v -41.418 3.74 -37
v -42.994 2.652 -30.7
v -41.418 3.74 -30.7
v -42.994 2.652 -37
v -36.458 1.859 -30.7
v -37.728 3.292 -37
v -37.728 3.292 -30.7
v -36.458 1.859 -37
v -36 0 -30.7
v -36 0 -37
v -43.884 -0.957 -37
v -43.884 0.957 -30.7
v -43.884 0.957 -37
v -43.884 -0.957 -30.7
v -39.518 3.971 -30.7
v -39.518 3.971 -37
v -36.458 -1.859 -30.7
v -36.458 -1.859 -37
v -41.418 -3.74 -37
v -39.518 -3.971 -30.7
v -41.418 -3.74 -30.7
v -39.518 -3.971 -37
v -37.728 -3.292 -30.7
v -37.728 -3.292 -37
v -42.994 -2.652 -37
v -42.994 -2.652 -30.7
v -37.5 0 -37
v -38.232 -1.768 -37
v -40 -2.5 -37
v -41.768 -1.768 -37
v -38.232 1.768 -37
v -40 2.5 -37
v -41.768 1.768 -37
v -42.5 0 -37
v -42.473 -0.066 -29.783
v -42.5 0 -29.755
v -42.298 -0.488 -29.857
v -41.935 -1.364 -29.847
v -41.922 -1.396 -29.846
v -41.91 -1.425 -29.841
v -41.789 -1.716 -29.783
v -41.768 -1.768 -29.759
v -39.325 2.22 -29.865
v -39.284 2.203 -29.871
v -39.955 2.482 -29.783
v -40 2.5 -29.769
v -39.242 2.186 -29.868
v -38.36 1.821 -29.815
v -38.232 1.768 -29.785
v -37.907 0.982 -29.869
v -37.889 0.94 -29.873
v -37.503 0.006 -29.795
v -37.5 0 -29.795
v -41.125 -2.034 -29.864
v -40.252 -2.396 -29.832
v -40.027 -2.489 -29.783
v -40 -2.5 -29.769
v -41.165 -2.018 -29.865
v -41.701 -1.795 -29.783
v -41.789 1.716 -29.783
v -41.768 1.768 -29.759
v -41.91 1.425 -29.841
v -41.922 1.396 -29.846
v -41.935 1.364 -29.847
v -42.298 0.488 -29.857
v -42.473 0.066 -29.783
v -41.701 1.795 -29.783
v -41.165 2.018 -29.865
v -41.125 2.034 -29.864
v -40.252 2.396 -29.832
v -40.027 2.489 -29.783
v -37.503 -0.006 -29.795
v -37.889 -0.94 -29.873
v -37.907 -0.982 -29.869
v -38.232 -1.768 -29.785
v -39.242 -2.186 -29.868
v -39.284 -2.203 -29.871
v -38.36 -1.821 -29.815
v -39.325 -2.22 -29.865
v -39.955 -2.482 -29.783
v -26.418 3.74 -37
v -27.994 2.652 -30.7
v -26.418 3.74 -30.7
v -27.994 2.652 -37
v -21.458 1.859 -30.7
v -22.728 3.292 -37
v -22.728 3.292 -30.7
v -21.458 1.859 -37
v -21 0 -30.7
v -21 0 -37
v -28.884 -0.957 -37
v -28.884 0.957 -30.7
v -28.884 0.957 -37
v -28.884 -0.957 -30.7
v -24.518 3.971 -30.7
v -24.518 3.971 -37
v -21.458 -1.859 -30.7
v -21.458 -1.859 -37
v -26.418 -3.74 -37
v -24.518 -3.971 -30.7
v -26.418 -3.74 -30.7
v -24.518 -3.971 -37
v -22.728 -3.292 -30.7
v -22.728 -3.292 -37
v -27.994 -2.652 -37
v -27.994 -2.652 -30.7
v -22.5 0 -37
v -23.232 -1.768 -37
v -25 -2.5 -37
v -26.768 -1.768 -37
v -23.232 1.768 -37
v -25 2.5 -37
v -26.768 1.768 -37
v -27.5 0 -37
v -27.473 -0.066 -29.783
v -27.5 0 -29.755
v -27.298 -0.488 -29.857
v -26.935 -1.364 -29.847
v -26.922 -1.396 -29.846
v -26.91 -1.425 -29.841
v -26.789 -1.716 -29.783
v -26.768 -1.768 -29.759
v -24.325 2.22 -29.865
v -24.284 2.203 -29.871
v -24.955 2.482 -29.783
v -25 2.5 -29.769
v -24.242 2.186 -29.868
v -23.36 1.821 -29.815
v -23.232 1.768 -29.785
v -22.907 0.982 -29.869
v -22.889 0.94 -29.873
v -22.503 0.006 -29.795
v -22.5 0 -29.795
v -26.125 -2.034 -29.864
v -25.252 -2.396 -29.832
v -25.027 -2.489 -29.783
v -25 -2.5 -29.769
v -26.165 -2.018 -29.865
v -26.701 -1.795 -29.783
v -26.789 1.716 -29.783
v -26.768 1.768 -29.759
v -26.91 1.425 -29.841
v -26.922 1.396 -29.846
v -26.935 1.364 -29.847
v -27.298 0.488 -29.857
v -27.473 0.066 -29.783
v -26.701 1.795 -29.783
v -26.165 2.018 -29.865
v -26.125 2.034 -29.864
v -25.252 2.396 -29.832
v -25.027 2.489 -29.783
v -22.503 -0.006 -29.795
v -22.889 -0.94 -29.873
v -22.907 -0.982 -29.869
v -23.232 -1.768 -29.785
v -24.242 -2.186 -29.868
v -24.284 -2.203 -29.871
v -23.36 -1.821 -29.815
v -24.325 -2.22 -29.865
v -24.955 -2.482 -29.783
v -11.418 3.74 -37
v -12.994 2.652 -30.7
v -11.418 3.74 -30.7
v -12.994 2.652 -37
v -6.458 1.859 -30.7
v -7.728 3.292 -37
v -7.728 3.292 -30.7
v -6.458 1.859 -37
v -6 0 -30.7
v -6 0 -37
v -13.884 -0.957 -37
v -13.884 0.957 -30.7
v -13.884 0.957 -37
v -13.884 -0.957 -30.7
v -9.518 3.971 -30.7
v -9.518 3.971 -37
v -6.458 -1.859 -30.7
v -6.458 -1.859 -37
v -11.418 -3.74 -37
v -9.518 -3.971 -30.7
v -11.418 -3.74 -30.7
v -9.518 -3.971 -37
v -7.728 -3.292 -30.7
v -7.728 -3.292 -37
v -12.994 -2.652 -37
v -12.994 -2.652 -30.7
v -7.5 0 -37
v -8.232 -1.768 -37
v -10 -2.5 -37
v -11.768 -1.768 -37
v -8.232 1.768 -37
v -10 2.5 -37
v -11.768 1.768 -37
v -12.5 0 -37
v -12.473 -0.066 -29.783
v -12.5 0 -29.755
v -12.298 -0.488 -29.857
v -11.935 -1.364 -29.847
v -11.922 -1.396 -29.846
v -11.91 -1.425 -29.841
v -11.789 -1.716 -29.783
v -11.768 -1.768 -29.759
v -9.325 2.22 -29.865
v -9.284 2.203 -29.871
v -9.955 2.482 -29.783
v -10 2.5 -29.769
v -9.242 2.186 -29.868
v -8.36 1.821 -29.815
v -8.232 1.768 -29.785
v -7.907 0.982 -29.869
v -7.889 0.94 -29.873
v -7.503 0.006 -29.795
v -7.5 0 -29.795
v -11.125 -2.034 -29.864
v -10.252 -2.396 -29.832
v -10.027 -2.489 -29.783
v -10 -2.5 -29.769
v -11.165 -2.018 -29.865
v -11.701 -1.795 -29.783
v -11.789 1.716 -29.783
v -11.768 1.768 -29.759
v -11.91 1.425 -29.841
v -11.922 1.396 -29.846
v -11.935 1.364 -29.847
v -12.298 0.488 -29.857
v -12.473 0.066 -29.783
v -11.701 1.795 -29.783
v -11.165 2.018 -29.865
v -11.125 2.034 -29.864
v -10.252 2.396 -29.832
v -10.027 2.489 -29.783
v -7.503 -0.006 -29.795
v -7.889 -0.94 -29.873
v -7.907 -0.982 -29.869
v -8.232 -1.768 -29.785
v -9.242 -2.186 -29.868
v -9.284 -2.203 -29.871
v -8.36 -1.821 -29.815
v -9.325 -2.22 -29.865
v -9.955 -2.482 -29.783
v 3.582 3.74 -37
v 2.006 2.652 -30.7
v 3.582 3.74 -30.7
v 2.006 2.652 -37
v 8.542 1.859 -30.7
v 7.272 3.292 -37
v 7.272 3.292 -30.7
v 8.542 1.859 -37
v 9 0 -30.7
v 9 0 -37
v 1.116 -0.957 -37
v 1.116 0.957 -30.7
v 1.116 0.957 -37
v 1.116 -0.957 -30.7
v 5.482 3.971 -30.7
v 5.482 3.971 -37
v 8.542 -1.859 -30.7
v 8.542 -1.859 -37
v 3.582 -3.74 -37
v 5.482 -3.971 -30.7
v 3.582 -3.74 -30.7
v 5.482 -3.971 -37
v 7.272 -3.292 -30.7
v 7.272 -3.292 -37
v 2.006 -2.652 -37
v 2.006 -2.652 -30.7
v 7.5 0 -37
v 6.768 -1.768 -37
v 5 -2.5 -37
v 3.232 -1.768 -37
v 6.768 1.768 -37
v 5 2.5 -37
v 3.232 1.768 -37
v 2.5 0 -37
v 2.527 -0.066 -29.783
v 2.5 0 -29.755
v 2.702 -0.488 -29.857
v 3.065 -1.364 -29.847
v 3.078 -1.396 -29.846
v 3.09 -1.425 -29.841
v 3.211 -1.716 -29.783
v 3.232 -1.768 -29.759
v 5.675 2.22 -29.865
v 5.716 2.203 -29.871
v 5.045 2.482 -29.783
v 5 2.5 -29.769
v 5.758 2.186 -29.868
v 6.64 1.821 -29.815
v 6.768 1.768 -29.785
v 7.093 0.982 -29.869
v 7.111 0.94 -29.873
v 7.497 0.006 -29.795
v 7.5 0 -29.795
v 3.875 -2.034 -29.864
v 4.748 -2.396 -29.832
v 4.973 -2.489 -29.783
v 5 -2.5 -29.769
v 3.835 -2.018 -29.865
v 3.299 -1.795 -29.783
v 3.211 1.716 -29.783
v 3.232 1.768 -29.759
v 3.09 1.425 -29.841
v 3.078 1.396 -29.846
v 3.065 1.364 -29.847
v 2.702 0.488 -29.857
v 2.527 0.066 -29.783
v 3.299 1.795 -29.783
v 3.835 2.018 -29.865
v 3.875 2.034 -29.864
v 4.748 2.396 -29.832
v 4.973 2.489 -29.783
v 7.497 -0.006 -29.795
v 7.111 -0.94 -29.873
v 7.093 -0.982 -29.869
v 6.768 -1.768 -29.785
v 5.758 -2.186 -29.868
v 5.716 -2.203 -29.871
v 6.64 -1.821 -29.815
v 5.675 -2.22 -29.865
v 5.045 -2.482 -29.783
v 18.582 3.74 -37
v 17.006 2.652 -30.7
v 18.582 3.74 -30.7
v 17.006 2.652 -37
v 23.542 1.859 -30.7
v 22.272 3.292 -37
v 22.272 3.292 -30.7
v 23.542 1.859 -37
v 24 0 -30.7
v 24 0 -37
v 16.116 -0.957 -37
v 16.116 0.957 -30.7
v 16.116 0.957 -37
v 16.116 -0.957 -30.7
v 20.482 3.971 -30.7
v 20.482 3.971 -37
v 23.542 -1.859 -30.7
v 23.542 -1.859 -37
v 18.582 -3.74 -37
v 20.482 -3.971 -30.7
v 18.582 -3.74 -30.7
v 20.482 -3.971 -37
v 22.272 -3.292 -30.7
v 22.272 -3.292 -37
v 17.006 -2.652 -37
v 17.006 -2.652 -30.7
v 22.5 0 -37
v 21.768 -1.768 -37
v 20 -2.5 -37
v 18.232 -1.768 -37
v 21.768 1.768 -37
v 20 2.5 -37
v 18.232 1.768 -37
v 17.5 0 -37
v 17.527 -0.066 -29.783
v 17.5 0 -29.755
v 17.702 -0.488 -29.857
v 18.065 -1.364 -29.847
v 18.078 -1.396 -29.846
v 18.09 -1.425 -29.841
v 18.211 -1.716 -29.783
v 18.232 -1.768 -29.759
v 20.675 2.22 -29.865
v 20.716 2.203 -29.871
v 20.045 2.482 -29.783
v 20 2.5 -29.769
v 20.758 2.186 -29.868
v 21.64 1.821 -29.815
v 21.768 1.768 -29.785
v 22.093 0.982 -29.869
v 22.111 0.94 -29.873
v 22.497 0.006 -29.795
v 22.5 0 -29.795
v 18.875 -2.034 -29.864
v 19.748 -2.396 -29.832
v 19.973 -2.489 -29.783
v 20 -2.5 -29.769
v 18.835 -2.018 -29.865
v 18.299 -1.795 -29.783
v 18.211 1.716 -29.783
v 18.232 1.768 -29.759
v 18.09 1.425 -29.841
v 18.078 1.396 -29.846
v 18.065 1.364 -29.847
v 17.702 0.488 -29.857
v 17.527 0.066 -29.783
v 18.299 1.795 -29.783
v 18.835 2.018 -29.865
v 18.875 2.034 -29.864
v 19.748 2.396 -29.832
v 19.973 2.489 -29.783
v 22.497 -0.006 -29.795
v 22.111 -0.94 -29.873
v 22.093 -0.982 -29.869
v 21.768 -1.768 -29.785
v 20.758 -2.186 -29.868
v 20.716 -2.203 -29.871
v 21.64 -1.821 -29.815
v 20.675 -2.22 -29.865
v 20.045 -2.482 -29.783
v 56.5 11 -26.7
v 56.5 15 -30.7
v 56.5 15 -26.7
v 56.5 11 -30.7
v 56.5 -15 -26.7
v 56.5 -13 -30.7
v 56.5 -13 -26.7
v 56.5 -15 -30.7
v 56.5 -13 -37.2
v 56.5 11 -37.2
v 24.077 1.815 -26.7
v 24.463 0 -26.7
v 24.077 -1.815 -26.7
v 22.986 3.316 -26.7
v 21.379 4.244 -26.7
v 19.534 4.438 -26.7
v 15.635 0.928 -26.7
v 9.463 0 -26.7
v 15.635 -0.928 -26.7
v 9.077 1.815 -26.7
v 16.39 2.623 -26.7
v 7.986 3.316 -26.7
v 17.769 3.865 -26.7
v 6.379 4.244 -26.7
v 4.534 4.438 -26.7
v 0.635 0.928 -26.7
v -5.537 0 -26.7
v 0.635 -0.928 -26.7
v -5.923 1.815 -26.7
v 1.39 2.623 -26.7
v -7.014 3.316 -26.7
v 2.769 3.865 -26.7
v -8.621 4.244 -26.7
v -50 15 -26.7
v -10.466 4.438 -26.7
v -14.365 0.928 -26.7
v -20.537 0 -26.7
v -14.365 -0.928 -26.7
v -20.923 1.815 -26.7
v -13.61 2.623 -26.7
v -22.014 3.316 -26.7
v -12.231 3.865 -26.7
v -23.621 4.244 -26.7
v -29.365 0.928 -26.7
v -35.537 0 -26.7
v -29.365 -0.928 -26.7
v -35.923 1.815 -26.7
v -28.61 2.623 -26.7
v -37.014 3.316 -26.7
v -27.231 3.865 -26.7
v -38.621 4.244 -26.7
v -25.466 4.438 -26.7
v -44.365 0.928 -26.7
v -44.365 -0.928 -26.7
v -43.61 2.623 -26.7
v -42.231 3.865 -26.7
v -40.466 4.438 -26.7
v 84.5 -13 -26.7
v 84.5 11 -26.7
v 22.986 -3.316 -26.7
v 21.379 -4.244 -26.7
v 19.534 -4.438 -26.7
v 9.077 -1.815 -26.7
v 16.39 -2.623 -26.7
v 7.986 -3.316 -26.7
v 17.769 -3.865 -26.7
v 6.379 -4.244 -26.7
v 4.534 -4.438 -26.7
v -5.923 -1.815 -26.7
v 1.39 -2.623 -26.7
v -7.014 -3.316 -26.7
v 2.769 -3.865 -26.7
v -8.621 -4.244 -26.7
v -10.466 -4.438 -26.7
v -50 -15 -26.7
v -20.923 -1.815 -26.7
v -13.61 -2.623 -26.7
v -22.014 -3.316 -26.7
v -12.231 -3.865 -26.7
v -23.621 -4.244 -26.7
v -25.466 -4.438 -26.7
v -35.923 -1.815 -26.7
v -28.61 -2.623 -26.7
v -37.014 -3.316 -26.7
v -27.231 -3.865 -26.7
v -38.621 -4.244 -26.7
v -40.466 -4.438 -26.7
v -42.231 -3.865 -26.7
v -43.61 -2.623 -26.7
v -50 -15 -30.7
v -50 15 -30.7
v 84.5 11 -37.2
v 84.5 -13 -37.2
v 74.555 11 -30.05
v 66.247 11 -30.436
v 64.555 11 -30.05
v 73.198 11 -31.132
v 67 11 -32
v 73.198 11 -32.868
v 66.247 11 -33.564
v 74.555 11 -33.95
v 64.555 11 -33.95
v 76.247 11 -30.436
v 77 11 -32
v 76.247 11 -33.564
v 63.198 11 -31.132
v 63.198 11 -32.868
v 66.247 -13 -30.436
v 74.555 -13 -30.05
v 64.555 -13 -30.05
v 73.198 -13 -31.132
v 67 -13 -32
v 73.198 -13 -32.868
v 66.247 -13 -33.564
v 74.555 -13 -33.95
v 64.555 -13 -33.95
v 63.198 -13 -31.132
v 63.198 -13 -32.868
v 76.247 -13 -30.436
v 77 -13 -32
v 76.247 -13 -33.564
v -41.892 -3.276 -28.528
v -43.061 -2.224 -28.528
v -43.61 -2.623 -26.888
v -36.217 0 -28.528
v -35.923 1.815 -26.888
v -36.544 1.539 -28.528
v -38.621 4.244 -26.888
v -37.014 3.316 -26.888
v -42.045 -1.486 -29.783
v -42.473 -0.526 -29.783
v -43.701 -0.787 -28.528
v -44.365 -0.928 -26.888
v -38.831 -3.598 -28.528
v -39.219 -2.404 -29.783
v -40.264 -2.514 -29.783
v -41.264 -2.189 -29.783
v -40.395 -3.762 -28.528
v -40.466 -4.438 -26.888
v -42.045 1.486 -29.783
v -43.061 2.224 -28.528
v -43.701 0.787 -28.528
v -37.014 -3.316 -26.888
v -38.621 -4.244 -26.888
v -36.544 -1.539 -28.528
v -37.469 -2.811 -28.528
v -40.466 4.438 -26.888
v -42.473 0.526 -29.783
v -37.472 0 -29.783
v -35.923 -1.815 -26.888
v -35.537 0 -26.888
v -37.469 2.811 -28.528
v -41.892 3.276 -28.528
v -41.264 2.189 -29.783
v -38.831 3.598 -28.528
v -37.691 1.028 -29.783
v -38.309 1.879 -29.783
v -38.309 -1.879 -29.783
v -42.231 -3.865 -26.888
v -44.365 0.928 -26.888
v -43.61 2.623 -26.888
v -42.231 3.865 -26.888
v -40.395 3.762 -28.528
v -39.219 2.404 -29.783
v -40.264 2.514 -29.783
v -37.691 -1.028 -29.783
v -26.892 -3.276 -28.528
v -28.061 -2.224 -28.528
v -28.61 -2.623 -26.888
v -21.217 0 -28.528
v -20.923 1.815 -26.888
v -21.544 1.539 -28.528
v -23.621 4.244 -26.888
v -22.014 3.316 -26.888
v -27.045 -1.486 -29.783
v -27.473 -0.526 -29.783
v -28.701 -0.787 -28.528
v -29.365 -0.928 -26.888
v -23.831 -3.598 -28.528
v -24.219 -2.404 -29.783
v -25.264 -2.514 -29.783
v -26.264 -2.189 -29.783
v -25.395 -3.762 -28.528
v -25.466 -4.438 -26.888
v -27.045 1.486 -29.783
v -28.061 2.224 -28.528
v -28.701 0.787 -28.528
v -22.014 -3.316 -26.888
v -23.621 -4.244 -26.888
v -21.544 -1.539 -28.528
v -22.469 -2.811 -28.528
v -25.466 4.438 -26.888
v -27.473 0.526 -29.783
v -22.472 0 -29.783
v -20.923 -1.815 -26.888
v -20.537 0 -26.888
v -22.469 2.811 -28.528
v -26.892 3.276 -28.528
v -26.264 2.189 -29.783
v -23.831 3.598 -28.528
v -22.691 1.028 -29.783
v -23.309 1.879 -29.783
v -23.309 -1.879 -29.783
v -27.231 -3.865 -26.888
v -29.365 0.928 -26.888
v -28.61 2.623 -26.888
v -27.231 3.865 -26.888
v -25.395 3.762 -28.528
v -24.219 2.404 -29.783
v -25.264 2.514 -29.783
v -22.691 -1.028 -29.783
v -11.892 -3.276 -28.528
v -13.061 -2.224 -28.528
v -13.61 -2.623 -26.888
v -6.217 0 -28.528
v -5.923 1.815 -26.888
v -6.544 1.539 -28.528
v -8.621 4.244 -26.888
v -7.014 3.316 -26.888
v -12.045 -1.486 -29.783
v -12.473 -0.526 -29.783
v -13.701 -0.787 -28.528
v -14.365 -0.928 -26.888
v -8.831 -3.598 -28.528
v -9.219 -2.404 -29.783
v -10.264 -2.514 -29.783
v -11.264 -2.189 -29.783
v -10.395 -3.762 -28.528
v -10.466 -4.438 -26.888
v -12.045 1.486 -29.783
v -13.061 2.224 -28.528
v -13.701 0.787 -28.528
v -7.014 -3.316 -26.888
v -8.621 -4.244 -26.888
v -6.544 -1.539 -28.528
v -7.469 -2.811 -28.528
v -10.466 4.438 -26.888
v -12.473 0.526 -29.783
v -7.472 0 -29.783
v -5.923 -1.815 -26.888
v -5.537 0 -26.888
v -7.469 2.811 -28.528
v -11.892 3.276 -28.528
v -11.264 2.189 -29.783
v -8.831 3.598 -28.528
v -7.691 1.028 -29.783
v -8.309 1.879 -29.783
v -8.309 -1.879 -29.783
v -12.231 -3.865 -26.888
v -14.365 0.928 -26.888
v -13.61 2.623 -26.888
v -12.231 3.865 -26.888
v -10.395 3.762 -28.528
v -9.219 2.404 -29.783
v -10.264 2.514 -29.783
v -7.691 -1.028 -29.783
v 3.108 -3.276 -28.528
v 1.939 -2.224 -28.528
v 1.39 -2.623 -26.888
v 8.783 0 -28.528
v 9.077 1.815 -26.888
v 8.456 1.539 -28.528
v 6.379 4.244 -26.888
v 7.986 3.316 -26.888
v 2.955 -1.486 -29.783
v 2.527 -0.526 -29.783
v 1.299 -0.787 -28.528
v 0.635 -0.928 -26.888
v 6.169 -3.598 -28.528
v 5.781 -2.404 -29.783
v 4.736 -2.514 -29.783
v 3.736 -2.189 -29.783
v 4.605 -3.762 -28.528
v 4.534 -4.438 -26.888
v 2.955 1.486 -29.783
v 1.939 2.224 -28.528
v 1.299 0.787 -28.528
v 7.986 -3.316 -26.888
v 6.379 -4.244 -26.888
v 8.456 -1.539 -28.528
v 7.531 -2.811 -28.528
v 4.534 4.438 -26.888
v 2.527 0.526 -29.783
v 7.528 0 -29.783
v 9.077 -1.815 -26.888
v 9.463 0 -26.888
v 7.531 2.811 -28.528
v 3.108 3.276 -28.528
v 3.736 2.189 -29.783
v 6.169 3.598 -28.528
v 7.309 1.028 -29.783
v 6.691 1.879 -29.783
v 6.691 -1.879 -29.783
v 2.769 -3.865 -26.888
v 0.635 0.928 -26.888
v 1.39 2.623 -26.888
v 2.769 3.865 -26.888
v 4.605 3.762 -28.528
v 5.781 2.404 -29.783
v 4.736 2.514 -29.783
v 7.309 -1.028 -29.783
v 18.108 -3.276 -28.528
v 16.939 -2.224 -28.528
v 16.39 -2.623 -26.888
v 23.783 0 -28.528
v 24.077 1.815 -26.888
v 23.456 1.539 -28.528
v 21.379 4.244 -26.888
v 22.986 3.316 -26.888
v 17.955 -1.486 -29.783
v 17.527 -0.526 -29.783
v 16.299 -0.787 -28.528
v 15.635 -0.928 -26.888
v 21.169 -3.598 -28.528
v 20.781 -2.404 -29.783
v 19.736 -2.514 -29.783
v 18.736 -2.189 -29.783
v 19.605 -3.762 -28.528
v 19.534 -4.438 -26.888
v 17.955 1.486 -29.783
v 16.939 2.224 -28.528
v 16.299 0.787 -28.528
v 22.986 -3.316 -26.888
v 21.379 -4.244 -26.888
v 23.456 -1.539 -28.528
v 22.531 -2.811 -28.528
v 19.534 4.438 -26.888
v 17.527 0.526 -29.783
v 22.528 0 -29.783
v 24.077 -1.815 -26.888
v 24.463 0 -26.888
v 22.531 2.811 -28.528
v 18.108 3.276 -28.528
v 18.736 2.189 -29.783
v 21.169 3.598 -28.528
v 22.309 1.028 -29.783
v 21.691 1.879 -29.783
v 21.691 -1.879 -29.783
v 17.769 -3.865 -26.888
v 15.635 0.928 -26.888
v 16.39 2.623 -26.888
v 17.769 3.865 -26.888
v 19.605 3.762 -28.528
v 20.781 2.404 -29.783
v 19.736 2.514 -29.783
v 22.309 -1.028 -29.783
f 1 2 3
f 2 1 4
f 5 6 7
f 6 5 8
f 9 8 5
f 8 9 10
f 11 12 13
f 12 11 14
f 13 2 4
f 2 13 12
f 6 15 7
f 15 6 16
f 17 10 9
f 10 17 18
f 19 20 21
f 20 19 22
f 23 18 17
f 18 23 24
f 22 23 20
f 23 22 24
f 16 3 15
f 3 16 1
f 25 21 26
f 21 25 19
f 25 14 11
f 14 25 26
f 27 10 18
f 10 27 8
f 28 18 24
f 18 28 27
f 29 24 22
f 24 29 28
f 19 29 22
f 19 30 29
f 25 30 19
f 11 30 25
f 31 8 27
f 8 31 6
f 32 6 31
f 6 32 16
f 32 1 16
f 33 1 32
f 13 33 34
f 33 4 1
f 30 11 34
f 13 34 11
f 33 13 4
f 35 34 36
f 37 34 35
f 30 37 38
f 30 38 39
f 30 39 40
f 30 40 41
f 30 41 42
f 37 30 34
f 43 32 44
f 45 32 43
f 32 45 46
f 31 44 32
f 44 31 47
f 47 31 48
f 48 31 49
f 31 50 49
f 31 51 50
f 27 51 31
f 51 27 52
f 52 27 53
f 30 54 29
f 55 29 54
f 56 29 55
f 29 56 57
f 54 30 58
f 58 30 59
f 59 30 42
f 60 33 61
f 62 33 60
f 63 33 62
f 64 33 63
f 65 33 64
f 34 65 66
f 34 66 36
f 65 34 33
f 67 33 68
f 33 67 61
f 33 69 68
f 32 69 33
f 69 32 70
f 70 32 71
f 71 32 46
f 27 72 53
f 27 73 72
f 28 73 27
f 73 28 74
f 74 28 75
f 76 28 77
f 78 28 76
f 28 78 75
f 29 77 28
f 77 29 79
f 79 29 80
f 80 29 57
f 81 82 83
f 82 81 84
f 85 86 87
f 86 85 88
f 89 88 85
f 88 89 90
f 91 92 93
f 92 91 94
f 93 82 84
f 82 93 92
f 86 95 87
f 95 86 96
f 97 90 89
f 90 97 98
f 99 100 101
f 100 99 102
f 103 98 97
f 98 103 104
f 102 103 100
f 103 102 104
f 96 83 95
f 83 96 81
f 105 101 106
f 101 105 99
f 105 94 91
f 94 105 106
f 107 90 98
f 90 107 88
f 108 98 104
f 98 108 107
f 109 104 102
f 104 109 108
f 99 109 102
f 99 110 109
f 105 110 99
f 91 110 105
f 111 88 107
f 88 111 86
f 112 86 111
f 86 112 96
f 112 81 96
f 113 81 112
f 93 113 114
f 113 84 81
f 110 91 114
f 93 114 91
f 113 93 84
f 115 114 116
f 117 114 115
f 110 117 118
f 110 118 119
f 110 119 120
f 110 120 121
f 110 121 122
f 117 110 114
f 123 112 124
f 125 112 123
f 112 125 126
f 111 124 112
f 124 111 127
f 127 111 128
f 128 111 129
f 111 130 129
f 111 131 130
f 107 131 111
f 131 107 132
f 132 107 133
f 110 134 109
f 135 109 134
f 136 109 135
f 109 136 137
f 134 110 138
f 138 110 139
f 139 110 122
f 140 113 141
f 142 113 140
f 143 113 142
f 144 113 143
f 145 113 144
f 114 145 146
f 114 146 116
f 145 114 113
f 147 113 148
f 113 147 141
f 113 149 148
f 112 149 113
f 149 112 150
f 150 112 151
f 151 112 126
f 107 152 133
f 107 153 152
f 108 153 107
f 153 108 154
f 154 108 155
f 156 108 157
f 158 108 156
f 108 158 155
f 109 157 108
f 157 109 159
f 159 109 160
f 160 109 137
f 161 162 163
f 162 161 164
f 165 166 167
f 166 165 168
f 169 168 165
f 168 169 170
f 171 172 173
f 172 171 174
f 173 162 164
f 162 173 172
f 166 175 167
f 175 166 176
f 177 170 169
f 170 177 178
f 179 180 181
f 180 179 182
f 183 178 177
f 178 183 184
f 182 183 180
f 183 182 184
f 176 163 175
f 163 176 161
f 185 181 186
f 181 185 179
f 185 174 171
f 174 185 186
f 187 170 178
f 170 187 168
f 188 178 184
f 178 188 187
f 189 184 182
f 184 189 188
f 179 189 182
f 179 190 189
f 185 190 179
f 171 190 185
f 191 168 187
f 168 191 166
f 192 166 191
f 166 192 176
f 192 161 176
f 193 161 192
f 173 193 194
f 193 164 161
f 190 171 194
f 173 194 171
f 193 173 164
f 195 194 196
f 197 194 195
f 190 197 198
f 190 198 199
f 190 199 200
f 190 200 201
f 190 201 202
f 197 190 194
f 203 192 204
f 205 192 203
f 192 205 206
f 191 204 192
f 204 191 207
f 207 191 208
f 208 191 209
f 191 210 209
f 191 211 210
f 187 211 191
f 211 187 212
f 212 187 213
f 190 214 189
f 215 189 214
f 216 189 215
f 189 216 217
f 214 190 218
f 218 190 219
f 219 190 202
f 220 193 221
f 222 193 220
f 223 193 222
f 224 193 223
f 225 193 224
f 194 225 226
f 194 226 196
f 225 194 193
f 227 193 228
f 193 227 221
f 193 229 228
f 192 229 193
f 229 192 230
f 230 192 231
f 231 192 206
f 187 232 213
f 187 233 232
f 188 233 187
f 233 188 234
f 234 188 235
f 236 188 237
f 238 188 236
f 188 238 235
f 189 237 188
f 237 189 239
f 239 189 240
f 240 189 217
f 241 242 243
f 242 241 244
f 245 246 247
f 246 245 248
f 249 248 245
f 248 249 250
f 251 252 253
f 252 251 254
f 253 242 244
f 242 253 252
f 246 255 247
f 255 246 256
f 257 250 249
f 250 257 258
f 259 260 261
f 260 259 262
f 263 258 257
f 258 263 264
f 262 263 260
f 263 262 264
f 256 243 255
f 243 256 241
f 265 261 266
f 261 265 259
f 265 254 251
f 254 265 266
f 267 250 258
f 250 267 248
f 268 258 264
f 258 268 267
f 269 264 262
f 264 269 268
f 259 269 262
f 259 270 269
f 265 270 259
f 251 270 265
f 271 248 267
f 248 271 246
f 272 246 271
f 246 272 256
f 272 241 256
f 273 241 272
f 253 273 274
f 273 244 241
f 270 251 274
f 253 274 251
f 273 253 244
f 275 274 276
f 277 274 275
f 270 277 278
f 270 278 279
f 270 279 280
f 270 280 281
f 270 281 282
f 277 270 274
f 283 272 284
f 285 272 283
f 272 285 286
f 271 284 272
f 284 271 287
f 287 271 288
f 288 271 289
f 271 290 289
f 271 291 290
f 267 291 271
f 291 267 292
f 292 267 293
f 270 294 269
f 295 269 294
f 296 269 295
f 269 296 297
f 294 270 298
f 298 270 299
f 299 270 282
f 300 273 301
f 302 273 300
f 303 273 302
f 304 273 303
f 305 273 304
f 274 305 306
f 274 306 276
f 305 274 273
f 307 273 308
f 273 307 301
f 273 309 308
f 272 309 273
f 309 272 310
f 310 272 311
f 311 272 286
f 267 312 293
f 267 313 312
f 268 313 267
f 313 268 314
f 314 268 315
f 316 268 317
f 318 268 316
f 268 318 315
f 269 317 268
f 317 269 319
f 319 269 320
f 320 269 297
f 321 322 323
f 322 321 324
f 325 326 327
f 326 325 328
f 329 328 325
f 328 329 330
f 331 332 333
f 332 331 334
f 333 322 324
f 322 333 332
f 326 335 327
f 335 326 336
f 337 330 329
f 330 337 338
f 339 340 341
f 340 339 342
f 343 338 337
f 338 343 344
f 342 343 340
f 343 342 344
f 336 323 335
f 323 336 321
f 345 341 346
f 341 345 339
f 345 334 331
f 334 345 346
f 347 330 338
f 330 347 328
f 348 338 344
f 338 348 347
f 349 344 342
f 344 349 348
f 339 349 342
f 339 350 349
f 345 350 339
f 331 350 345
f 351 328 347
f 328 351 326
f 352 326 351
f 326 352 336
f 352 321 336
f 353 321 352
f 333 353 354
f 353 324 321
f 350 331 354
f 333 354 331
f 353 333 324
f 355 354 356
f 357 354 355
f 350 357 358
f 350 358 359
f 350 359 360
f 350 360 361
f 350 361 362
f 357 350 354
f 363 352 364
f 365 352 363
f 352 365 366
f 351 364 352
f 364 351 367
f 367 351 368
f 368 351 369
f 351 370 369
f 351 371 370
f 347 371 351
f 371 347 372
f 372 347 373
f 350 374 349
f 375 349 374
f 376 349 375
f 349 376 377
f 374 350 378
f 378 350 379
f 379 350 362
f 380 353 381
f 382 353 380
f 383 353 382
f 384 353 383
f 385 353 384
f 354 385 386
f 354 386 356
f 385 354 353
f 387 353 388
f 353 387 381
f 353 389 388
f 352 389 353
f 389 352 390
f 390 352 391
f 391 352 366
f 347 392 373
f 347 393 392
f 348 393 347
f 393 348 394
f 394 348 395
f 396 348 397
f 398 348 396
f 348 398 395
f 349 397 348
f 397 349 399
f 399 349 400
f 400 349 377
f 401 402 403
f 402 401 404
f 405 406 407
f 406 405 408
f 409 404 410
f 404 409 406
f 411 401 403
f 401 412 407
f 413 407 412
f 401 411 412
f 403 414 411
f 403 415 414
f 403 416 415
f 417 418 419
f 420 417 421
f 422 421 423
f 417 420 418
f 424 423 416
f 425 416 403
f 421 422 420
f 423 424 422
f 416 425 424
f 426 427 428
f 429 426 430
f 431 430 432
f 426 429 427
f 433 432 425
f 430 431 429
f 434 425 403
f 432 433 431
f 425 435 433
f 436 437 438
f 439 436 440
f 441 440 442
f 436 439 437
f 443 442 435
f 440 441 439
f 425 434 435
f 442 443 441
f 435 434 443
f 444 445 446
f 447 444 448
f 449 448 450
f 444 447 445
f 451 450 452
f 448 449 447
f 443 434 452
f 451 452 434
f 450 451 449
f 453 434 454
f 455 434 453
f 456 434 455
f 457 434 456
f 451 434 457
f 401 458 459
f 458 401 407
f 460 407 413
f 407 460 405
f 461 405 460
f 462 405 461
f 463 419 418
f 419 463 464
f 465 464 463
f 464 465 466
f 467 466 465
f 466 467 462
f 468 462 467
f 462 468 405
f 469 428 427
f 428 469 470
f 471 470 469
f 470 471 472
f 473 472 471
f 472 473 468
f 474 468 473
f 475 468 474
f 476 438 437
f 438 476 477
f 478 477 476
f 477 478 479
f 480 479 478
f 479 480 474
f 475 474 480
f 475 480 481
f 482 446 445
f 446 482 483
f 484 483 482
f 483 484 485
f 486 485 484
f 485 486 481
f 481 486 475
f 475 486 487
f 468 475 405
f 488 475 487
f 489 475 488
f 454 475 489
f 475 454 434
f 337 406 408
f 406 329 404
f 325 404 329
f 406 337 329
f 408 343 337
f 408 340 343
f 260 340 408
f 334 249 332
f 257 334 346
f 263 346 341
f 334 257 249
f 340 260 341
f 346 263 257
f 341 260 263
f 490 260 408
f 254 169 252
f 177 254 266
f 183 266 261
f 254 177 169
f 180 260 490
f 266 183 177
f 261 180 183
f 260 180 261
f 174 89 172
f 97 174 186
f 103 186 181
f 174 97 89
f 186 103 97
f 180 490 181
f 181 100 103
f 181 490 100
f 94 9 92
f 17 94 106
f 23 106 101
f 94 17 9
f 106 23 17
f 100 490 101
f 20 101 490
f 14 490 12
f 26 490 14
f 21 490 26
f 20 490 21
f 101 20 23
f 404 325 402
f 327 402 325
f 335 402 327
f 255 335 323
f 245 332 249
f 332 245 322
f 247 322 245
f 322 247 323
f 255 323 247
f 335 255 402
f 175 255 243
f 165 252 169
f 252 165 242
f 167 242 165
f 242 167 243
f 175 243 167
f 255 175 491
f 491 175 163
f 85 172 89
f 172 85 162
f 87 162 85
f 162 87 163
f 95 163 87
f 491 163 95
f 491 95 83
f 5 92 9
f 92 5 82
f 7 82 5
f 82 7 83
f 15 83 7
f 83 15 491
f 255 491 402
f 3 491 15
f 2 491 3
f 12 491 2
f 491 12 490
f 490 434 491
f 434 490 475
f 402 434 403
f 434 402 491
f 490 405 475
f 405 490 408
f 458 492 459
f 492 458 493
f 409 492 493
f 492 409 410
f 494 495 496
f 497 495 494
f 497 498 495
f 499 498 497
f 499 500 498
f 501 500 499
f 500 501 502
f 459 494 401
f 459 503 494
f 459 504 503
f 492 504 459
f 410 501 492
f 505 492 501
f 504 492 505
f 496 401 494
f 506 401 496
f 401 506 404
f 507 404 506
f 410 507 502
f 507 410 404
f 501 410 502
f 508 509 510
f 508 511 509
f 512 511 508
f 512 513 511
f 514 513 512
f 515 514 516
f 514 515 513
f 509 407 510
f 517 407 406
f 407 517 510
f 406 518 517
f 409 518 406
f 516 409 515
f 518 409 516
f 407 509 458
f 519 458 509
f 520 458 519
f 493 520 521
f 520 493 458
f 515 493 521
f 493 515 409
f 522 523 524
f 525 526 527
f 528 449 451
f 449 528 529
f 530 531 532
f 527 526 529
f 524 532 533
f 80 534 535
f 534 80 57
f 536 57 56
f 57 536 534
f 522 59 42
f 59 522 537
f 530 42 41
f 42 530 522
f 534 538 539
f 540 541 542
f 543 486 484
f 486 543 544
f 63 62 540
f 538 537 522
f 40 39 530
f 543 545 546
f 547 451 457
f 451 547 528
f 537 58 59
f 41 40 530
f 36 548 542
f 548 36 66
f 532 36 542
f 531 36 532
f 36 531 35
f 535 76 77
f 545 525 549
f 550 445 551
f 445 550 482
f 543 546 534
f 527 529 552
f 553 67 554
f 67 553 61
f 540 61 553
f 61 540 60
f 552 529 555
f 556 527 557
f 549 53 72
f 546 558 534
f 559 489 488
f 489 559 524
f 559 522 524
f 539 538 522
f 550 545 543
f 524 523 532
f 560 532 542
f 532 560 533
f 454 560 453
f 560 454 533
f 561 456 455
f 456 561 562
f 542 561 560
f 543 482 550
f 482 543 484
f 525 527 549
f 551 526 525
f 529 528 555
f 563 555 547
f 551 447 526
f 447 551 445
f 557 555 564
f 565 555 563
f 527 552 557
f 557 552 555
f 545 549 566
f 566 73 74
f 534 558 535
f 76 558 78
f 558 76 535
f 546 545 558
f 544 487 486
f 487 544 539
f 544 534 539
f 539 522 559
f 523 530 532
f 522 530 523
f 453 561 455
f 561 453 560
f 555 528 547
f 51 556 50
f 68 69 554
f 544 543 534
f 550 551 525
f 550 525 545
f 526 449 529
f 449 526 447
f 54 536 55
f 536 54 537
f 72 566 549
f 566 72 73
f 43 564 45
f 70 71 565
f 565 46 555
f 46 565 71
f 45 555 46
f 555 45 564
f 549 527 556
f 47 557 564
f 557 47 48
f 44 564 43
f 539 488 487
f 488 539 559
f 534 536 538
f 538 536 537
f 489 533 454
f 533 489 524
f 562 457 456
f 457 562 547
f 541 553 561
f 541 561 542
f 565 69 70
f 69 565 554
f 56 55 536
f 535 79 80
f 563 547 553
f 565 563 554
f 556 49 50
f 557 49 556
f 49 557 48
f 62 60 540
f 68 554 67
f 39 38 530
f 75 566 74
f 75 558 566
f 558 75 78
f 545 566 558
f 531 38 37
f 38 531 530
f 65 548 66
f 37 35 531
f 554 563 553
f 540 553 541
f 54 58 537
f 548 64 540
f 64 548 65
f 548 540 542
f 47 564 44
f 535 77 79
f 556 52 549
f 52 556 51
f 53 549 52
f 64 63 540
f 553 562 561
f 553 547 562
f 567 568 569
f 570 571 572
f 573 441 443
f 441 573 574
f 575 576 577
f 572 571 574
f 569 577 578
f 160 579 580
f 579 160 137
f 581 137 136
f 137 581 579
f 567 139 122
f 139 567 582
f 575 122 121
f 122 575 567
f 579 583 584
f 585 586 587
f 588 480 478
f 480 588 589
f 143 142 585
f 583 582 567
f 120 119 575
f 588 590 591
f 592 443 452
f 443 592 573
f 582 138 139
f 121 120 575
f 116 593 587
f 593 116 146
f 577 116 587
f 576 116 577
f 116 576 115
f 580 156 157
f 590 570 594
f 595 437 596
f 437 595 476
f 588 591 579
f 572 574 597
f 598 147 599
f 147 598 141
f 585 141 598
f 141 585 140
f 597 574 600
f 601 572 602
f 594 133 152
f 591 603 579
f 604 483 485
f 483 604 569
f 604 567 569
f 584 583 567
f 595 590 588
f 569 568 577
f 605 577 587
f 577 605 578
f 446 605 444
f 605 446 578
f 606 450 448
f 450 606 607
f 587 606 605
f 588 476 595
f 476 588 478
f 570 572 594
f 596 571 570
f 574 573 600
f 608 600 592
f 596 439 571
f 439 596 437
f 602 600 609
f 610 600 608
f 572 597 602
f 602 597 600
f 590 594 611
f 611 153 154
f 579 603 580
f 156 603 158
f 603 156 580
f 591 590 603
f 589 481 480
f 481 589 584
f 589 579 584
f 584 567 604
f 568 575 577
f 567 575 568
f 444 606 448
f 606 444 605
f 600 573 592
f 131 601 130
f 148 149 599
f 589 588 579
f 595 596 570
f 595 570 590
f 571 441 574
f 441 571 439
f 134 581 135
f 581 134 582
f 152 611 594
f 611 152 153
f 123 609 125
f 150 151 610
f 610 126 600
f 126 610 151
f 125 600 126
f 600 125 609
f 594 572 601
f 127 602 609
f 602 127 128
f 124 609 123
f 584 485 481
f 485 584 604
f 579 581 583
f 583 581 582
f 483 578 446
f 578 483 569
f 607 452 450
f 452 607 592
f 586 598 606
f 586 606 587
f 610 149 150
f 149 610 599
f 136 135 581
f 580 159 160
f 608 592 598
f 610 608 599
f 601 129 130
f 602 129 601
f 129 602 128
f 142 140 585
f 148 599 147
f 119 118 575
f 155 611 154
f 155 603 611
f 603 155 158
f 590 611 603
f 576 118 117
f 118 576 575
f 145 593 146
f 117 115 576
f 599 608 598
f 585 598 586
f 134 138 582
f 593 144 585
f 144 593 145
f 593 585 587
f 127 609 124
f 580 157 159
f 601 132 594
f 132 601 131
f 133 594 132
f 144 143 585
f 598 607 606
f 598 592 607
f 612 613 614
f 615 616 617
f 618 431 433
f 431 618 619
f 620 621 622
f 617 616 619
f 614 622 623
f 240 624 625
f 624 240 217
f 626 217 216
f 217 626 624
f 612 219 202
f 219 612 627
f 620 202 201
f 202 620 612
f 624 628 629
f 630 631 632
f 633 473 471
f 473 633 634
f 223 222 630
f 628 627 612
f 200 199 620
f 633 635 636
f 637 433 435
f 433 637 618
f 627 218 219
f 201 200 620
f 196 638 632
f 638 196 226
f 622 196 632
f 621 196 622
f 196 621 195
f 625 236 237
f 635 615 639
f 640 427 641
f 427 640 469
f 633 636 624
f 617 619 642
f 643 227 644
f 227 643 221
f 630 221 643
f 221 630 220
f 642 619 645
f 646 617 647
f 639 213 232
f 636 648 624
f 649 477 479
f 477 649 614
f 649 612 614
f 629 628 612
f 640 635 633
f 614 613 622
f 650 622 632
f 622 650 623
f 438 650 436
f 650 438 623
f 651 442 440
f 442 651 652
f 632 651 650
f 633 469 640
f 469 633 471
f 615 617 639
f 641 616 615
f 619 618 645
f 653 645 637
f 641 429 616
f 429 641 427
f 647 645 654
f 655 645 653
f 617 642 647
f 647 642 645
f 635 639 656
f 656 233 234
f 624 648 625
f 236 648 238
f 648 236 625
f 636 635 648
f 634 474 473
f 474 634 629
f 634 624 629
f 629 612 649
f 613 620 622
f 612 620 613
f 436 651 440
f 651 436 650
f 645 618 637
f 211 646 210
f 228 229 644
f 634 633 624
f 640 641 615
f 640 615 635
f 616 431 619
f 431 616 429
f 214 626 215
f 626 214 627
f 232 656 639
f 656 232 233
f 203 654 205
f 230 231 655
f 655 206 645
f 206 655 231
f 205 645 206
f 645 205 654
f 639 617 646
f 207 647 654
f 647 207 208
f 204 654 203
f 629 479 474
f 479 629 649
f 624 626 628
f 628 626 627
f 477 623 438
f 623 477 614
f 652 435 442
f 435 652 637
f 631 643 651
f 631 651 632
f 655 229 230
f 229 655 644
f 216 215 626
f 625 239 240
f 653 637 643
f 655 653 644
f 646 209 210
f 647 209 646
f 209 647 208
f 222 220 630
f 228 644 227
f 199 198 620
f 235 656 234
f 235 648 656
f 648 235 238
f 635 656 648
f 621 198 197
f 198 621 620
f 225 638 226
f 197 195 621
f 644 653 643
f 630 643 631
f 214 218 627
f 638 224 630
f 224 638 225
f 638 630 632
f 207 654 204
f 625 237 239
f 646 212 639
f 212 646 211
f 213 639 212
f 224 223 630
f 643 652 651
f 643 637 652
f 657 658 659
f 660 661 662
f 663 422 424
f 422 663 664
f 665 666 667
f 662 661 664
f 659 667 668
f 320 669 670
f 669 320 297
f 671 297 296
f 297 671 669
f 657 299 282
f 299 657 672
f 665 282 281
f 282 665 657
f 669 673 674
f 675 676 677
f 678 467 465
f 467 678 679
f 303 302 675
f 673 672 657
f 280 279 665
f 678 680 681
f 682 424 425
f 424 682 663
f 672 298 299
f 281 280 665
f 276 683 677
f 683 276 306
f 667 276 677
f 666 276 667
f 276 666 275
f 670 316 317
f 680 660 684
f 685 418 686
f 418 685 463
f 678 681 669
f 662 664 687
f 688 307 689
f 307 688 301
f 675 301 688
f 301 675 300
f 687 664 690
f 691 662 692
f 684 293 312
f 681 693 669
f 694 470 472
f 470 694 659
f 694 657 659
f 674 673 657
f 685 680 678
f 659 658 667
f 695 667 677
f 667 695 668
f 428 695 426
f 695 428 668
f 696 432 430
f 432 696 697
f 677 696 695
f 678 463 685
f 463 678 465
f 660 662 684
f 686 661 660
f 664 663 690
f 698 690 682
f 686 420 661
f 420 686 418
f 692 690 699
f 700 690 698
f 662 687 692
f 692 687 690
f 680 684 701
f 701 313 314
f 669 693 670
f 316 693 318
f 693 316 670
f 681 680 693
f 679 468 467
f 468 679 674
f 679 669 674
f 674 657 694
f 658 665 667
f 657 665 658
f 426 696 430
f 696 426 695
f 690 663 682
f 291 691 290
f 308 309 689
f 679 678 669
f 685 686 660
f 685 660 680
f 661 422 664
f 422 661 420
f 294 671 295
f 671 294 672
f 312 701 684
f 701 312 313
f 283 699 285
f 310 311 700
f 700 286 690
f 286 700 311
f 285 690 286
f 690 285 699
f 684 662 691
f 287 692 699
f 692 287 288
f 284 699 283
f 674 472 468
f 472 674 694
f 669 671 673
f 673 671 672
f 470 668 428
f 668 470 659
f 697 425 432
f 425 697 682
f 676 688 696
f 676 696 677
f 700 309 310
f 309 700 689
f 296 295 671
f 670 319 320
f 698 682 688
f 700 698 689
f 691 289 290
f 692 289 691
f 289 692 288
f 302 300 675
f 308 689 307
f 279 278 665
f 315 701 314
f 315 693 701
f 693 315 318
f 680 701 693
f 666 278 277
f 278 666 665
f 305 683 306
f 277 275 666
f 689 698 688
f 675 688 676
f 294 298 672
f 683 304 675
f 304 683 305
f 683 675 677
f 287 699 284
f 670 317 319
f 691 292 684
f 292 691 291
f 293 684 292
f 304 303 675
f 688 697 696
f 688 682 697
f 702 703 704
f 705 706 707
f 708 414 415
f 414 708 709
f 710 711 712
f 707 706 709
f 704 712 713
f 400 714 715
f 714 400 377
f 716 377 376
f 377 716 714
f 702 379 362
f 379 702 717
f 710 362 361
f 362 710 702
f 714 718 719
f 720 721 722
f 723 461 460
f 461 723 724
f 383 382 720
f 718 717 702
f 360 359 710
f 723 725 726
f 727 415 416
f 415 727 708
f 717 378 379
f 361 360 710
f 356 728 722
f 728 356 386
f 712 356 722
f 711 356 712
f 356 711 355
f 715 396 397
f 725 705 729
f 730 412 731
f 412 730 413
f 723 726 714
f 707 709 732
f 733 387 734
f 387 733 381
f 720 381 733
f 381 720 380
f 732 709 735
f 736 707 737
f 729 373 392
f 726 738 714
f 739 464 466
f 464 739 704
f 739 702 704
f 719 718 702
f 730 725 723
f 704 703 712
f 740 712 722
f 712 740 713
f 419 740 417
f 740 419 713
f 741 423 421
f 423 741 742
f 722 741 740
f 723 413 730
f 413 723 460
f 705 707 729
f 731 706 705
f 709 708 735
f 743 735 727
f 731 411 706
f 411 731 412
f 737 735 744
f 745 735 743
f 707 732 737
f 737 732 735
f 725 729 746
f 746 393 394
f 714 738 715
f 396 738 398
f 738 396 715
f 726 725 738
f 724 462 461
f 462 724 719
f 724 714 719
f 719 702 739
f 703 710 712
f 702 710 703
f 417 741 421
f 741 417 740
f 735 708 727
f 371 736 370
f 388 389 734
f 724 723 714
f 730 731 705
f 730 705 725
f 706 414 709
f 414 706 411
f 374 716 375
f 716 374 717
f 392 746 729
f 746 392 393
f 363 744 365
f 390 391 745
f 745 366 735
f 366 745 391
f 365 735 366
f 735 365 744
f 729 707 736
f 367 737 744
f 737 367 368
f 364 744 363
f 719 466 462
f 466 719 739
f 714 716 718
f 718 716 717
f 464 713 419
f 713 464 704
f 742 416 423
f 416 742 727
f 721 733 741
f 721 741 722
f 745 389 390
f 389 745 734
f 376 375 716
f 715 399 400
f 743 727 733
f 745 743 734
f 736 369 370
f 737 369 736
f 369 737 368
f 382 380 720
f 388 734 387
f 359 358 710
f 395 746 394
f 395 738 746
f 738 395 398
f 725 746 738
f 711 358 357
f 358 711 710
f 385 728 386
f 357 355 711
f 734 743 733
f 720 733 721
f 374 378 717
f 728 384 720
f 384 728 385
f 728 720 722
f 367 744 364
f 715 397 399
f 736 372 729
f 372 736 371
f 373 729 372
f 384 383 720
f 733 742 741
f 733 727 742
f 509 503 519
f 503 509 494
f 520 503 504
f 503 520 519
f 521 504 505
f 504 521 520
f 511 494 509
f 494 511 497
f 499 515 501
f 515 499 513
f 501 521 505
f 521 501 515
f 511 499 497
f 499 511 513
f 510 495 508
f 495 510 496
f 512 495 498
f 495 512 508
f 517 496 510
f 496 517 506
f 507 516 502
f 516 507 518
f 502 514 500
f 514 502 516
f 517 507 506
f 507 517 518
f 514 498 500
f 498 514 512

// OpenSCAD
//This is a modification of " Public Domain Parametric Involute Spur Gear (and involute helical gear and involute rack)
// by Leemon Baird, 2011, Leemon@Leemon.com
//http://www.thingiverse.com/thing:5505  "

//Modifications by racatack June 2016:
//  -Incorporated 'module InvoluteGear_rack()' from the 11/11/15 comment by quisam2342 in thing:5505 to fix noted problems in rack generation at various tooth sizes
//  -Added a section for an optional 'backboard' that can be used to stiffen an otherwise skinny rack
//  -Added sections for optional Stop Blocks at either or both ends of a rack
//  -Removed extra gears from the example since I only need one pinion. See thing:5505 example section to gain more insight into gear generation.





//////////////////////////////////////////////////////////////////////////////////////////////
// Public Domain Parametric Involute Spur Gear (and involute helical gear and involute rack)
// version 1.1
// by Leemon Baird, 2011, Leemon@Leemon.com
//http://www.thingiverse.com/thing:5505
//
// This file is public domain.  Use it for any purpose, including commercial
// applications.  Attribution would be nice, but is not required.  There is
// no warranty of any kind, including its correctness, usefulness, or safety.
// 
// This is parameterized involute spur (or helical) gear.  It is much simpler and less powerful than
// others on Thingiverse.  But it is public domain.  I implemented it from scratch from the 
// descriptions and equations on Wikipedia and the web, using Mathematica for calculations and testing,
// and I now release it into the public domain.
//
//		http://en.wikipedia.org/wiki/Involute_gear
//		http://en.wikipedia.org/wiki/Gear
//		http://en.wikipedia.org/wiki/List_of_gear_nomenclature
//		http://gtrebaol.free.fr/doc/catia/spur_gear.html
//		http://www.cs.cmu.edu/~rapidproto/mechanisms/chpt7.html
//
// The module gear() gives an involute spur gear, with reasonable defaults for all the parameters.
// Normally, you should just choose the first 4 parameters, and let the rest be default values.
// The module gear() gives a gear in the XY plane, centered on the origin, with one tooth centered on
// the positive Y axis.  The various functions below it take the same parameters, and return various
// measurements for the gear.  The most important is pitch_radius, which tells how far apart to space
// gears that are meshing, and adendum_radius, which gives the size of the region filled by the gear.
// A gear has a "pitch circle", which is an invisible circle that cuts through the middle of each
// tooth (though not the exact center). In order for two gears to mesh, their pitch circles should 
// just touch.  So the distance between their centers should be pitch_radius() for one, plus pitch_radius() 
// for the other, which gives the radii of their pitch circles.
//
// In order for two gears to mesh, they must have the same mm_per_tooth and pressure_angle parameters.  
// mm_per_tooth gives the number of millimeters of arc around the pitch circle covered by one tooth and one
// space between teeth.  The pitch angle controls how flat or bulged the sides of the teeth are.  Common
// values include 14.5 degrees and 20 degrees, and occasionally 25.  Though I've seen 28 recommended for
// plastic gears. Larger numbers bulge out more, giving stronger teeth, so 28 degrees is the default here.
//
// The ratio of number_of_teeth for two meshing gears gives how many times one will make a full 
// revolution when the the other makes one full revolution.  If the two numbers are coprime (i.e. 
// are not both divisible by the same number greater than 1), then every tooth on one gear
// will meet every tooth on the other, for more even wear.  So coprime numbers of teeth are good.
//
// The module rack() gives a rack, which is a bar with teeth.  A rack can mesh with any
// gear that has the same mm_per_tooth and pressure_angle.
//
// Some terminology: 
// The outline of a gear is a smooth circle (the "pitch circle") which has mountains and valleys
// added so it is toothed.  So there is an inner circle (the "root circle") that touches the 
// base of all the teeth, an outer circle that touches the tips of all the teeth,
// and the invisible pitch circle in between them.  There is also a "base circle", which can be smaller than
// all three of the others, which controls the shape of the teeth.  The side of each tooth lies on the path 
// that the end of a string would follow if it were wrapped tightly around the base circle, then slowly unwound.  
// That shape is an "involute", which gives this type of gear its name.
//
//////////////////////////////////////////////////////////////////////////////////////////////

//An involute spur gear, with reasonable defaults for all the parameters.
//Normally, you should just choose the first 4 parameters, and let the rest be default values.
//Meshing gears must match in mm_per_tooth, pressure_angle, and twist,
//and be separated by the sum of their pitch radii, which can be found with pitch_radius().
module gear (
	mm_per_tooth    = 3,    //this is the "circular pitch", the circumference of the pitch circle divided by the number of teeth
	number_of_teeth = 11,   //total number of teeth around the entire perimeter
	thickness       = 6,    //thickness of gear in mm
	hole_diameter   = 3,    //diameter of the hole in the center, in mm
	twist           = 0,    //teeth rotate this many degrees from bottom of gear to top.  360 makes the gear a screw with each thread going around once
	teeth_to_hide   = 0,    //number of teeth to delete to make this only a fraction of a circle
	pressure_angle  = 28,   //Controls how straight or bulged the tooth sides are. In degrees.
	clearance       = 0.0,  //gap between top of a tooth on one gear and bottom of valley on a meshing gear (in millimeters)
	backlash        = 0.0   //gap between two meshing teeth, in the direction along the circumference of the pitch circle
) {
	assign(pi = 3.1415926)
	assign(p  = mm_per_tooth * number_of_teeth / pi / 2)  //radius of pitch circle
	assign(c  = p + mm_per_tooth / pi - clearance)        //radius of outer circle
	assign(b  = p*cos(pressure_angle))                    //radius of base circle
	assign(r  = p-(c-p)-clearance)                        //radius of root circle
	assign(t  = mm_per_tooth/2-backlash/2)                //tooth thickness at pitch circle
	assign(k  = -iang(b, p) - t/2/p/pi*180) {             //angle to where involute meets base circle on each side of tooth
		difference() {
			for (i = [0:number_of_teeth-teeth_to_hide-1] )
				rotate([0,0,i*360/number_of_teeth])
					linear_extrude(height = thickness, center = true, convexity = 10, twist = twist)
						polygon(
							points=[
								[0, -hole_diameter/10],
								polar(r, -181/number_of_teeth),
								polar(r, r<b ? k : -180/number_of_teeth),
								q7(0/5,r,b,c,k, 1),q7(1/5,r,b,c,k, 1),q7(2/5,r,b,c,k, 1),q7(3/5,r,b,c,k, 1),q7(4/5,r,b,c,k, 1),q7(5/5,r,b,c,k, 1),
								q7(5/5,r,b,c,k,-1),q7(4/5,r,b,c,k,-1),q7(3/5,r,b,c,k,-1),q7(2/5,r,b,c,k,-1),q7(1/5,r,b,c,k,-1),q7(0/5,r,b,c,k,-1),
								polar(r, r<b ? -k : 180/number_of_teeth),
								polar(r, 181/number_of_teeth)
							],
 							paths=[[0,1,2,3,4,5,6,7,8,9,10,11,12,13,14,15,16]]
						);
			cylinder(h=2*thickness+1, r=hole_diameter/2, center=true, $fn=20);
		}
	}
};	
//these 4 functions are used by gear
function polar(r,theta)   = r*[sin(theta), cos(theta)];                            //convert polar to cartesian coordinates
function iang(r1,r2)      = sqrt((r2/r1)*(r2/r1) - 1)/3.1415926*180 - acos(r1/r2); //unwind a string this many degrees to go from radius r1 to radius r2
function q7(f,r,b,r2,t,s) = q6(b,s,t,(1-f)*max(b,r)+f*r2);                         //radius a fraction f up the curved side of the tooth 
function q6(b,s,t,d)      = polar(d,s*(iang(b,d)+t));                              //point at radius d on the involute curve

//a rack, which is a straight line with teeth (the same as a segment from a giant gear with a huge number of teeth).
//The "pitch circle" is a line along the X axis.
//module rack (
//	mm_per_tooth    = 3,    //this is the "circular pitch", the circumference of the pitch circle divided by the number //of teeth
//	number_of_teeth = 11,   //total number of teeth along the rack
//	thickness       = 6,    //thickness of rack in mm (affects each tooth)
//	height          = 120,   //height of rack in mm, from tooth top to far side of rack.
//	pressure_angle  = 28,   //Controls how straight or bulged the tooth sides are. In degrees.
//	backlash        = 0.0   //gap between two meshing teeth, in the direction along the circumference of the pitch circle
//) {
//	assign(pi = 3.1415926)
//	assign(a = mm_per_tooth / pi) //addendum
//	assign(t = a*cos(pressure_angle)-1)         //tooth side is tilted so top/bottom corners move this amount
//		for (i = [0:number_of_teeth-1] )
//			translate([i*mm_per_tooth,0,0])
//				linear_extrude(height = thickness, center = true, convexity = 10)
//					polygon(
//						points=[
//							[-mm_per_tooth * 3/4,                 a-height],
//							[-mm_per_tooth * 3/4 - backlash,     -a],
//							[-mm_per_tooth * 1/4 + backlash - t, -a],
//							[-mm_per_tooth * 1/4 + backlash + t,  a],
//							[ mm_per_tooth * 1/4 - backlash - t,  a],
//							[ mm_per_tooth * 1/4 - backlash + t, -a],
//							[ mm_per_tooth * 3/4 + backlash,     -a],
//							[ mm_per_tooth * 3/4,                 a-height],
//						],
//						paths=[[0,1,2,3,4,5,6,7]]
//					);
//};	


  //rac note - This section generates the rack body and teeth. It is from the 11/11/15 comment by quisam2342 in thing:5505 to fix noted problems with rack generation, and replaces the original 'module rack()'
////////////////////////////////////////////////////////////////////////////////////////////////
// The module InvoluteGear_rack() gives a involute gear rack, which is a bar with teeth.
// A rack can mesh with any gear that has the same mm_per_tooth and pressure_angle.
// The "pitch circle" is a line along the X axis.
//
// mm_per_tooth     this is the "circular pitch", the circumference of the pitch circle
//                  divided by the number of teeth
//
// number_of_teeth  total number of teeth along the rack
//
// thickness        thickness of rack in mm
//
// height           height of rack in mm, from tooth top to far side of rack
//
// pressure_angle   controls how straight or bulged the tooth sides are, in degrees
//
// clearance        gap between top of a tooth on one gear and bottom of valley
//                  on a meshing gear, in millimeters
//
// backlash         gap between two meshing teeth, in the direction along the circumference
//                  of the pitch circle
////////////////////////////////////////////////////////////////////////////////////////////////



module InvoluteGear_rack (
    mm_per_tooth    = 3,   //Default numbers in this section get overridden by numbers in 'example rack and pinion' section, so set your values there.
    number_of_teeth = 11,
    thickness       = 6,
    height          = 4,
    
  //rac - Added variables for backboard and stop blocks: 
 //set your values in the 'example rack and pinion' section, as defaults given here will be overridden by that section 
    backboard_thickness = 2.0,
    backboard_height = 1.0, 
    stop_height = backboard_height, 
    left_stop_enable = 1, 
    right_stop_enable = 1,
    
//These defaults are not redefined in the example section:
    pressure_angle  = 28,  
    clearance       = 0.0,
    backlash        = 0.0

)

{
    // addendum - tooth height above pitch line
    assign(addendum =        module_value(mm_per_tooth) - clearance)

    // dedendum - tooth height below pitch line
    assign(dedendum = 1.25 * module_value(mm_per_tooth)            ) 


    for (i = [0:number_of_teeth-1] )
        translate([(i+0.5)*mm_per_tooth,height-addendum,0])
            linear_extrude(height = thickness, center = true, convexity = 10)  //'height' parameter here is not the same as 'height' parameter of module
                polygon(
                    points=[
                        [-1/2 * mm_per_tooth,                                              addendum-height],
                        [-1/2 * mm_per_tooth,                                             -dedendum],
                        [-1/4 * mm_per_tooth + backlash - dedendum * tan(pressure_angle), -dedendum],
                        [-1/4 * mm_per_tooth + backlash + addendum * tan(pressure_angle),  addendum],
                        [ 1/4 * mm_per_tooth - backlash - addendum * tan(pressure_angle),  addendum],
                        [ 1/4 * mm_per_tooth - backlash + dedendum * tan(pressure_angle), -dedendum],
                        [ 1/2 * mm_per_tooth,                                             -dedendum],
                        [ 1/2 * mm_per_tooth,                                              addendum-height],
                    ],
                    paths=[[0,1,2,3,4,5,6,7]]
                );

   //rac -added - This section optionally creates a 'stop block' at the left end of the rack
            translate([(-0.11)*mm_per_tooth,0,0.5*(-thickness)])  
            linear_extrude(height = left_stop_enable*thickness, center = false, convexity = 10)
                polygon(
                    points=[
                        [-1/2 * mm_per_tooth,height+stop_height],   //stop_height extends stop block above teeth, change the number to change the extension amount
                        [-1/2 * mm_per_tooth,0],
                        [ 1/2 * mm_per_tooth,0],
                        [ 1/2 * mm_per_tooth,height+stop_height],   //stop_height extends stop block above teeth, change the number to change the extension amount
                    ],
                    paths=[[0,1,2,3]]
                );


    //rac -added - This section optionally creates a 'stop block' at the right end of the rack
            translate([(0.11+number_of_teeth)*mm_per_tooth,0,0.5*(-thickness)])  
            linear_extrude(height = right_stop_enable*thickness, center = false, convexity = 10)
                polygon(
                    points=[
                        [-1/2 * mm_per_tooth,height+stop_height],   //stop_height extends stop block above teeth
                        [-1/2 * mm_per_tooth,0],
                        [ 1/2 * mm_per_tooth,0],
                        [ 1/2 * mm_per_tooth,height+stop_height],   //stop_height extends stop block above teeth
                    ],
                    paths=[[0,1,2,3]]
                );


    //rac -added - This section optionally creates a 'backboard' on one side of the rack. Can be used to add stiffness for a 'thin' rack (i.e. a rack with low height and/or thickness numbers) or if a large negative height is used it can extend under the rack as a mounting flange.
    for (i = [0:number_of_teeth-1] )
        translate([(i+0.5)*mm_per_tooth,0,0.5*(-thickness+backboard_thickness)])    
        //0.55*(-thickness+backboard_thickness) starts the backboard at one side of the rack and extrudes it inward
            linear_extrude(height = backboard_thickness, center = true, convexity = 10)
                polygon(
                    points=[
                        [-1/2 * mm_per_tooth,height+backboard_height],   //backboard_height extends backboard above teeth
                        [-1/2 * mm_per_tooth,0],

                        [ 1/2 * mm_per_tooth,0],
                        [ 1/2 * mm_per_tooth,height+backboard_height],   //backboard_height extends backboard above teeth
                    ],
                    paths=[[0,1,2,3]]
                );


}


//These 5 functions let the user find the derived dimensions of the gear.
//A gear fits within a circle of radius outer_radius, and two gears should have
//their centers separated by the sum of their pictch_radius.
function circular_pitch  (mm_per_tooth=3) = mm_per_tooth;                     //tooth density expressed as "circular pitch" in millimeters
function diametral_pitch (mm_per_tooth=3) = 3.1415926 / mm_per_tooth;         //tooth density expressed as "diametral pitch" in teeth per millimeter
function module_value    (mm_per_tooth=3) = mm_per_tooth / 3.1415926;                //tooth density expressed as "module" or "modulus" in millimeters
function pitch_radius    (mm_per_tooth=3,number_of_teeth=11) = mm_per_tooth * number_of_teeth / 3.1415926 / 2;
function outer_radius    (mm_per_tooth=3,number_of_teeth=11,clearance=0.1)    //The gear fits entirely within a cylinder of this radius.
	= mm_per_tooth*(1+number_of_teeth/2)/3.1415926  - clearance;              

//////////////////////////////////////////////////////////////////////////////////////////////
//example rack and pinion: 
//ENTER YOUR VALUES HERE: (not in InvoluteGear_rack() defaults)

//all distances in mm
n1 = 23; //red gear number of teeth
n5 = 17;  //gray rack number of teeth
mm_per_tooth = 3.25; //all meshing gears need the same mm_per_tooth (and the same pressure_angle)
thickness    = 7.0;  // depth of the rack, including backboard if any. The pinion will be this depth minus the backboard_thickness
hole         = 2;   //hole diameter in pinion gear
height       = 4;  // distance from bottom of the rack to the tips of the teeth

//rac - Added - Set your values for Backboard and Stop Blocks here 
backboard_thickness = 0.0; //set to zero for no backboard
backboard_height = 2;   //set to zero for top of backboard to be even with tips of teeth, a positive number will extend above the teeth by the chosen amount, vice-versa for negative (use large negative to make a flange on underside of rack)
stop_height = 2; //Stop Blocks will extend this much above the teeth, can be positive or negative
left_stop_enable = 1;  //set to 1 to generate Left Stop Block, set to 0 to disable
right_stop_enable = 1;  //set to 1 to generate Right Stop Block, set to 0 to disable

//end of inputs -------------------------------------------------------

d1 =pitch_radius(mm_per_tooth,n1);


module pinion() {
//Generation of pinion gear:
    translate([ 0,    0, -.5*backboard_thickness]) rotate([0,0, $t*360/n1])                 color([1.00,0.75,0.75]) gear(mm_per_tooth,n1,(thickness-backboard_thickness),hole); //rac -RE above: 'thickness-backboard_thickness' is used here to reduce gear thickness for backboard on rack, The '-.5*backboard_thickness' in translate puts gear bottom even with rack bottom
    

}

module rack() {
    //Generation of rack, and Relative positioning of gear and rack:
    translate([(-floor(n5/2)-floor(n1/2)+$t+n1/2-1/2), -height-backboard_height-d1-mm_per_tooth, 0]) rotate([0,0,0]) color([0.75,0.75,0.75]) InvoluteGear_rack(mm_per_tooth,n5,thickness,height,backboard_thickness,backboard_height,stop_height,left_stop_enable,right_stop_enable);   //rac - In the above 'translate' instruction, the middle parameter sets spacing between the rack and the pinion. I've set it to '-height-backboard_height-d1-mm_per_tooth' to give a proportionate offset that allows for ease of printing for most sets of gear & rack parameters. If you use a large negative backboard height the gear and rack may overlap. That can be fixed by substituting some other number/formula for '-height-backboard_height-d1-mm_per_tooth'. Try for example -3*d1, or just subtract an additional fixed offset from what's in there now (e.g. (-height-backboard_height-d1-mm_per_tooth)-14.)    
}

holes=5;
layer_h= 4;
radius = 30;
space=30; // degrees
distance= 22;
valve_r = 3.5;
border = 3;
offset = 1.0;
length = 106.5;

module pipe() {
  difference() {
    cylinder(r=valve_r + 0.5, h=layer_h * 2.5);
    cylinder(r=valve_r - 1, h=100);
    // translate([0,0,9]) sphere(r=valve_r * 1.3);  
  }    
}

module topBase() {
      translate([0, 0, 15.5]) scale(2.0) rotate([90,0,0]) rack();
      translate([-50,-10,-26.7]) cube([30,20,12]);
      translate([-50,-10,-26.7]) cube([150,20,2.5]);    
}

module top() {
  difference() {
    union () {
      topBase();
      translate([-40, 0, -15]) pipe();
    }
    translate([-40, 0, -30]) cylinder(r=valve_r - 1, h=100);
    translate([-40, 0, -27]) cylinder(r=8.2, h=3.5);
  }  
}

module bottom() {
    height = 4;
    hoses = 5;
    width = 30;
    length = 106.5;
    difference() {
      union() {
      translate([-50,-15,-26.7 - height]) cube([length, width, height]);
      translate([-50 + length,-13,-26.7 - height - 6.5]) cube([28,width - 6, height + 6.5]);
        for(i = [1 : 1 : hoses]) {
          translate([-55 + i * 15, 0, -37]) pipe();
        }    
      }
      for(i = [1 : 1 : hoses]) {
          translate([-55 + i * 15, 0, -38]) union() {
            cylinder(r=valve_r - 1, h=100);
            translate([0,0,12]) sphere(r=valve_r * 1.3);    
          }
      }
      translate([75.0,22,-32]) rotate([90, 0, 0]) cylinder(r=valve_r - 1.5, h=80);
      translate([65.0,22,-32]) rotate([90, 0, 0]) cylinder(r=valve_r - 1.5, h=80);
    }
    
    
}


module parallaxServo() {
    import("/Users/wooga/Downloads/Servo/Parallax_servo_repaired.stl");
}
module servoHolder() {
    difference() {
        translate([54.5, 10.6,-40.0])  cube([27, 8, 60]);
        
        translate([78, 47.5, -38]) rotate([90, -90, 0]) scale(1.01) parallaxServo();
          
        translate([72.5,25,15]) rotate([90, 0, 0]) cylinder(r=valve_r - 1.5, h=80);
        translate([62.5,25,15]) rotate([90, 0, 0]) cylinder(r=valve_r - 1.5, h=80);
 
        translate([72.5,25,-35]) rotate([90, 0, 0]) cylinder(r=valve_r - 1.5, h=80);
        translate([62.5,25,-35]) rotate([90, 0, 0]) cylinder(r=valve_r - 1.5, h=80);
        translate([67.5,25,0]) rotate([90, 0, 0]) cylinder(r=5, h=80);
    }        
}
module middle() {
    height = 4;
    width = 30;
    difference() {
      union() {
        translate([-50,-15,-26.7]) cube([106.5,width, height]);
        translate([-55,-15,-26.7]) cube([5, width, 15]);
        translate([2.5,0,3]) servoHolder();
      }
      translate([2,0,3]) {
          scale(1.05) translate([-50.1, -10, -36]) cube([151,20,20]);          
      }
    }
}

module horn() {
  import("/Users/wooga/Downloads/Parallax_Futaba_Servo_Horn_Mounts/files/Parallax_Quad_Servo_Horn_Mount_expanded_holes_with_holes_for_nuts_rev_2.STL");
    
}
module myPinion() {
    difference() {
      union() {
        translate([70, 0, 3]) scale([2.0, 1.4, 2.0]) rotate([90,10,0]) pinion();
        translate([47.5, 10, 25.5]) rotate([180, 0, 0]) horn();
      };
      for(i = [1 : 1 : 4]) {
        translate([74.5 + i * 3,20,3]) rotate([90]) cylinder(r=1.2, h=80);
        translate([65.5 - i * 3,20,3]) rotate([90]) cylinder(r=1.2, h=80);
        translate([70.0, 20, 7.5 + i * 3]) rotate([90]) cylinder(r=1.2, h=80);
        translate([70.0, 20, -1.5 - i * 3]) rotate([90]) cylinder(r=1.2, h=80);    
      }
      translate([70 + 10,20,3 + 10]) rotate([90]) cylinder(r=5, h=80);
      translate([70 - 10,20,3 + 10]) rotate([90]) cylinder(r=5, h=80);
      translate([70 + 10,20,3 - 10]) rotate([90]) cylinder(r=5, h=80);
      translate([70 - 10,20,3 - 10]) rotate([90]) cylinder(r=5, h=80);     
    }
      
}
myPinion();
top();
translate([0, 0, 0]) middle();
!translate([0, 0, 0]) bottom();
//translate() topBase();
